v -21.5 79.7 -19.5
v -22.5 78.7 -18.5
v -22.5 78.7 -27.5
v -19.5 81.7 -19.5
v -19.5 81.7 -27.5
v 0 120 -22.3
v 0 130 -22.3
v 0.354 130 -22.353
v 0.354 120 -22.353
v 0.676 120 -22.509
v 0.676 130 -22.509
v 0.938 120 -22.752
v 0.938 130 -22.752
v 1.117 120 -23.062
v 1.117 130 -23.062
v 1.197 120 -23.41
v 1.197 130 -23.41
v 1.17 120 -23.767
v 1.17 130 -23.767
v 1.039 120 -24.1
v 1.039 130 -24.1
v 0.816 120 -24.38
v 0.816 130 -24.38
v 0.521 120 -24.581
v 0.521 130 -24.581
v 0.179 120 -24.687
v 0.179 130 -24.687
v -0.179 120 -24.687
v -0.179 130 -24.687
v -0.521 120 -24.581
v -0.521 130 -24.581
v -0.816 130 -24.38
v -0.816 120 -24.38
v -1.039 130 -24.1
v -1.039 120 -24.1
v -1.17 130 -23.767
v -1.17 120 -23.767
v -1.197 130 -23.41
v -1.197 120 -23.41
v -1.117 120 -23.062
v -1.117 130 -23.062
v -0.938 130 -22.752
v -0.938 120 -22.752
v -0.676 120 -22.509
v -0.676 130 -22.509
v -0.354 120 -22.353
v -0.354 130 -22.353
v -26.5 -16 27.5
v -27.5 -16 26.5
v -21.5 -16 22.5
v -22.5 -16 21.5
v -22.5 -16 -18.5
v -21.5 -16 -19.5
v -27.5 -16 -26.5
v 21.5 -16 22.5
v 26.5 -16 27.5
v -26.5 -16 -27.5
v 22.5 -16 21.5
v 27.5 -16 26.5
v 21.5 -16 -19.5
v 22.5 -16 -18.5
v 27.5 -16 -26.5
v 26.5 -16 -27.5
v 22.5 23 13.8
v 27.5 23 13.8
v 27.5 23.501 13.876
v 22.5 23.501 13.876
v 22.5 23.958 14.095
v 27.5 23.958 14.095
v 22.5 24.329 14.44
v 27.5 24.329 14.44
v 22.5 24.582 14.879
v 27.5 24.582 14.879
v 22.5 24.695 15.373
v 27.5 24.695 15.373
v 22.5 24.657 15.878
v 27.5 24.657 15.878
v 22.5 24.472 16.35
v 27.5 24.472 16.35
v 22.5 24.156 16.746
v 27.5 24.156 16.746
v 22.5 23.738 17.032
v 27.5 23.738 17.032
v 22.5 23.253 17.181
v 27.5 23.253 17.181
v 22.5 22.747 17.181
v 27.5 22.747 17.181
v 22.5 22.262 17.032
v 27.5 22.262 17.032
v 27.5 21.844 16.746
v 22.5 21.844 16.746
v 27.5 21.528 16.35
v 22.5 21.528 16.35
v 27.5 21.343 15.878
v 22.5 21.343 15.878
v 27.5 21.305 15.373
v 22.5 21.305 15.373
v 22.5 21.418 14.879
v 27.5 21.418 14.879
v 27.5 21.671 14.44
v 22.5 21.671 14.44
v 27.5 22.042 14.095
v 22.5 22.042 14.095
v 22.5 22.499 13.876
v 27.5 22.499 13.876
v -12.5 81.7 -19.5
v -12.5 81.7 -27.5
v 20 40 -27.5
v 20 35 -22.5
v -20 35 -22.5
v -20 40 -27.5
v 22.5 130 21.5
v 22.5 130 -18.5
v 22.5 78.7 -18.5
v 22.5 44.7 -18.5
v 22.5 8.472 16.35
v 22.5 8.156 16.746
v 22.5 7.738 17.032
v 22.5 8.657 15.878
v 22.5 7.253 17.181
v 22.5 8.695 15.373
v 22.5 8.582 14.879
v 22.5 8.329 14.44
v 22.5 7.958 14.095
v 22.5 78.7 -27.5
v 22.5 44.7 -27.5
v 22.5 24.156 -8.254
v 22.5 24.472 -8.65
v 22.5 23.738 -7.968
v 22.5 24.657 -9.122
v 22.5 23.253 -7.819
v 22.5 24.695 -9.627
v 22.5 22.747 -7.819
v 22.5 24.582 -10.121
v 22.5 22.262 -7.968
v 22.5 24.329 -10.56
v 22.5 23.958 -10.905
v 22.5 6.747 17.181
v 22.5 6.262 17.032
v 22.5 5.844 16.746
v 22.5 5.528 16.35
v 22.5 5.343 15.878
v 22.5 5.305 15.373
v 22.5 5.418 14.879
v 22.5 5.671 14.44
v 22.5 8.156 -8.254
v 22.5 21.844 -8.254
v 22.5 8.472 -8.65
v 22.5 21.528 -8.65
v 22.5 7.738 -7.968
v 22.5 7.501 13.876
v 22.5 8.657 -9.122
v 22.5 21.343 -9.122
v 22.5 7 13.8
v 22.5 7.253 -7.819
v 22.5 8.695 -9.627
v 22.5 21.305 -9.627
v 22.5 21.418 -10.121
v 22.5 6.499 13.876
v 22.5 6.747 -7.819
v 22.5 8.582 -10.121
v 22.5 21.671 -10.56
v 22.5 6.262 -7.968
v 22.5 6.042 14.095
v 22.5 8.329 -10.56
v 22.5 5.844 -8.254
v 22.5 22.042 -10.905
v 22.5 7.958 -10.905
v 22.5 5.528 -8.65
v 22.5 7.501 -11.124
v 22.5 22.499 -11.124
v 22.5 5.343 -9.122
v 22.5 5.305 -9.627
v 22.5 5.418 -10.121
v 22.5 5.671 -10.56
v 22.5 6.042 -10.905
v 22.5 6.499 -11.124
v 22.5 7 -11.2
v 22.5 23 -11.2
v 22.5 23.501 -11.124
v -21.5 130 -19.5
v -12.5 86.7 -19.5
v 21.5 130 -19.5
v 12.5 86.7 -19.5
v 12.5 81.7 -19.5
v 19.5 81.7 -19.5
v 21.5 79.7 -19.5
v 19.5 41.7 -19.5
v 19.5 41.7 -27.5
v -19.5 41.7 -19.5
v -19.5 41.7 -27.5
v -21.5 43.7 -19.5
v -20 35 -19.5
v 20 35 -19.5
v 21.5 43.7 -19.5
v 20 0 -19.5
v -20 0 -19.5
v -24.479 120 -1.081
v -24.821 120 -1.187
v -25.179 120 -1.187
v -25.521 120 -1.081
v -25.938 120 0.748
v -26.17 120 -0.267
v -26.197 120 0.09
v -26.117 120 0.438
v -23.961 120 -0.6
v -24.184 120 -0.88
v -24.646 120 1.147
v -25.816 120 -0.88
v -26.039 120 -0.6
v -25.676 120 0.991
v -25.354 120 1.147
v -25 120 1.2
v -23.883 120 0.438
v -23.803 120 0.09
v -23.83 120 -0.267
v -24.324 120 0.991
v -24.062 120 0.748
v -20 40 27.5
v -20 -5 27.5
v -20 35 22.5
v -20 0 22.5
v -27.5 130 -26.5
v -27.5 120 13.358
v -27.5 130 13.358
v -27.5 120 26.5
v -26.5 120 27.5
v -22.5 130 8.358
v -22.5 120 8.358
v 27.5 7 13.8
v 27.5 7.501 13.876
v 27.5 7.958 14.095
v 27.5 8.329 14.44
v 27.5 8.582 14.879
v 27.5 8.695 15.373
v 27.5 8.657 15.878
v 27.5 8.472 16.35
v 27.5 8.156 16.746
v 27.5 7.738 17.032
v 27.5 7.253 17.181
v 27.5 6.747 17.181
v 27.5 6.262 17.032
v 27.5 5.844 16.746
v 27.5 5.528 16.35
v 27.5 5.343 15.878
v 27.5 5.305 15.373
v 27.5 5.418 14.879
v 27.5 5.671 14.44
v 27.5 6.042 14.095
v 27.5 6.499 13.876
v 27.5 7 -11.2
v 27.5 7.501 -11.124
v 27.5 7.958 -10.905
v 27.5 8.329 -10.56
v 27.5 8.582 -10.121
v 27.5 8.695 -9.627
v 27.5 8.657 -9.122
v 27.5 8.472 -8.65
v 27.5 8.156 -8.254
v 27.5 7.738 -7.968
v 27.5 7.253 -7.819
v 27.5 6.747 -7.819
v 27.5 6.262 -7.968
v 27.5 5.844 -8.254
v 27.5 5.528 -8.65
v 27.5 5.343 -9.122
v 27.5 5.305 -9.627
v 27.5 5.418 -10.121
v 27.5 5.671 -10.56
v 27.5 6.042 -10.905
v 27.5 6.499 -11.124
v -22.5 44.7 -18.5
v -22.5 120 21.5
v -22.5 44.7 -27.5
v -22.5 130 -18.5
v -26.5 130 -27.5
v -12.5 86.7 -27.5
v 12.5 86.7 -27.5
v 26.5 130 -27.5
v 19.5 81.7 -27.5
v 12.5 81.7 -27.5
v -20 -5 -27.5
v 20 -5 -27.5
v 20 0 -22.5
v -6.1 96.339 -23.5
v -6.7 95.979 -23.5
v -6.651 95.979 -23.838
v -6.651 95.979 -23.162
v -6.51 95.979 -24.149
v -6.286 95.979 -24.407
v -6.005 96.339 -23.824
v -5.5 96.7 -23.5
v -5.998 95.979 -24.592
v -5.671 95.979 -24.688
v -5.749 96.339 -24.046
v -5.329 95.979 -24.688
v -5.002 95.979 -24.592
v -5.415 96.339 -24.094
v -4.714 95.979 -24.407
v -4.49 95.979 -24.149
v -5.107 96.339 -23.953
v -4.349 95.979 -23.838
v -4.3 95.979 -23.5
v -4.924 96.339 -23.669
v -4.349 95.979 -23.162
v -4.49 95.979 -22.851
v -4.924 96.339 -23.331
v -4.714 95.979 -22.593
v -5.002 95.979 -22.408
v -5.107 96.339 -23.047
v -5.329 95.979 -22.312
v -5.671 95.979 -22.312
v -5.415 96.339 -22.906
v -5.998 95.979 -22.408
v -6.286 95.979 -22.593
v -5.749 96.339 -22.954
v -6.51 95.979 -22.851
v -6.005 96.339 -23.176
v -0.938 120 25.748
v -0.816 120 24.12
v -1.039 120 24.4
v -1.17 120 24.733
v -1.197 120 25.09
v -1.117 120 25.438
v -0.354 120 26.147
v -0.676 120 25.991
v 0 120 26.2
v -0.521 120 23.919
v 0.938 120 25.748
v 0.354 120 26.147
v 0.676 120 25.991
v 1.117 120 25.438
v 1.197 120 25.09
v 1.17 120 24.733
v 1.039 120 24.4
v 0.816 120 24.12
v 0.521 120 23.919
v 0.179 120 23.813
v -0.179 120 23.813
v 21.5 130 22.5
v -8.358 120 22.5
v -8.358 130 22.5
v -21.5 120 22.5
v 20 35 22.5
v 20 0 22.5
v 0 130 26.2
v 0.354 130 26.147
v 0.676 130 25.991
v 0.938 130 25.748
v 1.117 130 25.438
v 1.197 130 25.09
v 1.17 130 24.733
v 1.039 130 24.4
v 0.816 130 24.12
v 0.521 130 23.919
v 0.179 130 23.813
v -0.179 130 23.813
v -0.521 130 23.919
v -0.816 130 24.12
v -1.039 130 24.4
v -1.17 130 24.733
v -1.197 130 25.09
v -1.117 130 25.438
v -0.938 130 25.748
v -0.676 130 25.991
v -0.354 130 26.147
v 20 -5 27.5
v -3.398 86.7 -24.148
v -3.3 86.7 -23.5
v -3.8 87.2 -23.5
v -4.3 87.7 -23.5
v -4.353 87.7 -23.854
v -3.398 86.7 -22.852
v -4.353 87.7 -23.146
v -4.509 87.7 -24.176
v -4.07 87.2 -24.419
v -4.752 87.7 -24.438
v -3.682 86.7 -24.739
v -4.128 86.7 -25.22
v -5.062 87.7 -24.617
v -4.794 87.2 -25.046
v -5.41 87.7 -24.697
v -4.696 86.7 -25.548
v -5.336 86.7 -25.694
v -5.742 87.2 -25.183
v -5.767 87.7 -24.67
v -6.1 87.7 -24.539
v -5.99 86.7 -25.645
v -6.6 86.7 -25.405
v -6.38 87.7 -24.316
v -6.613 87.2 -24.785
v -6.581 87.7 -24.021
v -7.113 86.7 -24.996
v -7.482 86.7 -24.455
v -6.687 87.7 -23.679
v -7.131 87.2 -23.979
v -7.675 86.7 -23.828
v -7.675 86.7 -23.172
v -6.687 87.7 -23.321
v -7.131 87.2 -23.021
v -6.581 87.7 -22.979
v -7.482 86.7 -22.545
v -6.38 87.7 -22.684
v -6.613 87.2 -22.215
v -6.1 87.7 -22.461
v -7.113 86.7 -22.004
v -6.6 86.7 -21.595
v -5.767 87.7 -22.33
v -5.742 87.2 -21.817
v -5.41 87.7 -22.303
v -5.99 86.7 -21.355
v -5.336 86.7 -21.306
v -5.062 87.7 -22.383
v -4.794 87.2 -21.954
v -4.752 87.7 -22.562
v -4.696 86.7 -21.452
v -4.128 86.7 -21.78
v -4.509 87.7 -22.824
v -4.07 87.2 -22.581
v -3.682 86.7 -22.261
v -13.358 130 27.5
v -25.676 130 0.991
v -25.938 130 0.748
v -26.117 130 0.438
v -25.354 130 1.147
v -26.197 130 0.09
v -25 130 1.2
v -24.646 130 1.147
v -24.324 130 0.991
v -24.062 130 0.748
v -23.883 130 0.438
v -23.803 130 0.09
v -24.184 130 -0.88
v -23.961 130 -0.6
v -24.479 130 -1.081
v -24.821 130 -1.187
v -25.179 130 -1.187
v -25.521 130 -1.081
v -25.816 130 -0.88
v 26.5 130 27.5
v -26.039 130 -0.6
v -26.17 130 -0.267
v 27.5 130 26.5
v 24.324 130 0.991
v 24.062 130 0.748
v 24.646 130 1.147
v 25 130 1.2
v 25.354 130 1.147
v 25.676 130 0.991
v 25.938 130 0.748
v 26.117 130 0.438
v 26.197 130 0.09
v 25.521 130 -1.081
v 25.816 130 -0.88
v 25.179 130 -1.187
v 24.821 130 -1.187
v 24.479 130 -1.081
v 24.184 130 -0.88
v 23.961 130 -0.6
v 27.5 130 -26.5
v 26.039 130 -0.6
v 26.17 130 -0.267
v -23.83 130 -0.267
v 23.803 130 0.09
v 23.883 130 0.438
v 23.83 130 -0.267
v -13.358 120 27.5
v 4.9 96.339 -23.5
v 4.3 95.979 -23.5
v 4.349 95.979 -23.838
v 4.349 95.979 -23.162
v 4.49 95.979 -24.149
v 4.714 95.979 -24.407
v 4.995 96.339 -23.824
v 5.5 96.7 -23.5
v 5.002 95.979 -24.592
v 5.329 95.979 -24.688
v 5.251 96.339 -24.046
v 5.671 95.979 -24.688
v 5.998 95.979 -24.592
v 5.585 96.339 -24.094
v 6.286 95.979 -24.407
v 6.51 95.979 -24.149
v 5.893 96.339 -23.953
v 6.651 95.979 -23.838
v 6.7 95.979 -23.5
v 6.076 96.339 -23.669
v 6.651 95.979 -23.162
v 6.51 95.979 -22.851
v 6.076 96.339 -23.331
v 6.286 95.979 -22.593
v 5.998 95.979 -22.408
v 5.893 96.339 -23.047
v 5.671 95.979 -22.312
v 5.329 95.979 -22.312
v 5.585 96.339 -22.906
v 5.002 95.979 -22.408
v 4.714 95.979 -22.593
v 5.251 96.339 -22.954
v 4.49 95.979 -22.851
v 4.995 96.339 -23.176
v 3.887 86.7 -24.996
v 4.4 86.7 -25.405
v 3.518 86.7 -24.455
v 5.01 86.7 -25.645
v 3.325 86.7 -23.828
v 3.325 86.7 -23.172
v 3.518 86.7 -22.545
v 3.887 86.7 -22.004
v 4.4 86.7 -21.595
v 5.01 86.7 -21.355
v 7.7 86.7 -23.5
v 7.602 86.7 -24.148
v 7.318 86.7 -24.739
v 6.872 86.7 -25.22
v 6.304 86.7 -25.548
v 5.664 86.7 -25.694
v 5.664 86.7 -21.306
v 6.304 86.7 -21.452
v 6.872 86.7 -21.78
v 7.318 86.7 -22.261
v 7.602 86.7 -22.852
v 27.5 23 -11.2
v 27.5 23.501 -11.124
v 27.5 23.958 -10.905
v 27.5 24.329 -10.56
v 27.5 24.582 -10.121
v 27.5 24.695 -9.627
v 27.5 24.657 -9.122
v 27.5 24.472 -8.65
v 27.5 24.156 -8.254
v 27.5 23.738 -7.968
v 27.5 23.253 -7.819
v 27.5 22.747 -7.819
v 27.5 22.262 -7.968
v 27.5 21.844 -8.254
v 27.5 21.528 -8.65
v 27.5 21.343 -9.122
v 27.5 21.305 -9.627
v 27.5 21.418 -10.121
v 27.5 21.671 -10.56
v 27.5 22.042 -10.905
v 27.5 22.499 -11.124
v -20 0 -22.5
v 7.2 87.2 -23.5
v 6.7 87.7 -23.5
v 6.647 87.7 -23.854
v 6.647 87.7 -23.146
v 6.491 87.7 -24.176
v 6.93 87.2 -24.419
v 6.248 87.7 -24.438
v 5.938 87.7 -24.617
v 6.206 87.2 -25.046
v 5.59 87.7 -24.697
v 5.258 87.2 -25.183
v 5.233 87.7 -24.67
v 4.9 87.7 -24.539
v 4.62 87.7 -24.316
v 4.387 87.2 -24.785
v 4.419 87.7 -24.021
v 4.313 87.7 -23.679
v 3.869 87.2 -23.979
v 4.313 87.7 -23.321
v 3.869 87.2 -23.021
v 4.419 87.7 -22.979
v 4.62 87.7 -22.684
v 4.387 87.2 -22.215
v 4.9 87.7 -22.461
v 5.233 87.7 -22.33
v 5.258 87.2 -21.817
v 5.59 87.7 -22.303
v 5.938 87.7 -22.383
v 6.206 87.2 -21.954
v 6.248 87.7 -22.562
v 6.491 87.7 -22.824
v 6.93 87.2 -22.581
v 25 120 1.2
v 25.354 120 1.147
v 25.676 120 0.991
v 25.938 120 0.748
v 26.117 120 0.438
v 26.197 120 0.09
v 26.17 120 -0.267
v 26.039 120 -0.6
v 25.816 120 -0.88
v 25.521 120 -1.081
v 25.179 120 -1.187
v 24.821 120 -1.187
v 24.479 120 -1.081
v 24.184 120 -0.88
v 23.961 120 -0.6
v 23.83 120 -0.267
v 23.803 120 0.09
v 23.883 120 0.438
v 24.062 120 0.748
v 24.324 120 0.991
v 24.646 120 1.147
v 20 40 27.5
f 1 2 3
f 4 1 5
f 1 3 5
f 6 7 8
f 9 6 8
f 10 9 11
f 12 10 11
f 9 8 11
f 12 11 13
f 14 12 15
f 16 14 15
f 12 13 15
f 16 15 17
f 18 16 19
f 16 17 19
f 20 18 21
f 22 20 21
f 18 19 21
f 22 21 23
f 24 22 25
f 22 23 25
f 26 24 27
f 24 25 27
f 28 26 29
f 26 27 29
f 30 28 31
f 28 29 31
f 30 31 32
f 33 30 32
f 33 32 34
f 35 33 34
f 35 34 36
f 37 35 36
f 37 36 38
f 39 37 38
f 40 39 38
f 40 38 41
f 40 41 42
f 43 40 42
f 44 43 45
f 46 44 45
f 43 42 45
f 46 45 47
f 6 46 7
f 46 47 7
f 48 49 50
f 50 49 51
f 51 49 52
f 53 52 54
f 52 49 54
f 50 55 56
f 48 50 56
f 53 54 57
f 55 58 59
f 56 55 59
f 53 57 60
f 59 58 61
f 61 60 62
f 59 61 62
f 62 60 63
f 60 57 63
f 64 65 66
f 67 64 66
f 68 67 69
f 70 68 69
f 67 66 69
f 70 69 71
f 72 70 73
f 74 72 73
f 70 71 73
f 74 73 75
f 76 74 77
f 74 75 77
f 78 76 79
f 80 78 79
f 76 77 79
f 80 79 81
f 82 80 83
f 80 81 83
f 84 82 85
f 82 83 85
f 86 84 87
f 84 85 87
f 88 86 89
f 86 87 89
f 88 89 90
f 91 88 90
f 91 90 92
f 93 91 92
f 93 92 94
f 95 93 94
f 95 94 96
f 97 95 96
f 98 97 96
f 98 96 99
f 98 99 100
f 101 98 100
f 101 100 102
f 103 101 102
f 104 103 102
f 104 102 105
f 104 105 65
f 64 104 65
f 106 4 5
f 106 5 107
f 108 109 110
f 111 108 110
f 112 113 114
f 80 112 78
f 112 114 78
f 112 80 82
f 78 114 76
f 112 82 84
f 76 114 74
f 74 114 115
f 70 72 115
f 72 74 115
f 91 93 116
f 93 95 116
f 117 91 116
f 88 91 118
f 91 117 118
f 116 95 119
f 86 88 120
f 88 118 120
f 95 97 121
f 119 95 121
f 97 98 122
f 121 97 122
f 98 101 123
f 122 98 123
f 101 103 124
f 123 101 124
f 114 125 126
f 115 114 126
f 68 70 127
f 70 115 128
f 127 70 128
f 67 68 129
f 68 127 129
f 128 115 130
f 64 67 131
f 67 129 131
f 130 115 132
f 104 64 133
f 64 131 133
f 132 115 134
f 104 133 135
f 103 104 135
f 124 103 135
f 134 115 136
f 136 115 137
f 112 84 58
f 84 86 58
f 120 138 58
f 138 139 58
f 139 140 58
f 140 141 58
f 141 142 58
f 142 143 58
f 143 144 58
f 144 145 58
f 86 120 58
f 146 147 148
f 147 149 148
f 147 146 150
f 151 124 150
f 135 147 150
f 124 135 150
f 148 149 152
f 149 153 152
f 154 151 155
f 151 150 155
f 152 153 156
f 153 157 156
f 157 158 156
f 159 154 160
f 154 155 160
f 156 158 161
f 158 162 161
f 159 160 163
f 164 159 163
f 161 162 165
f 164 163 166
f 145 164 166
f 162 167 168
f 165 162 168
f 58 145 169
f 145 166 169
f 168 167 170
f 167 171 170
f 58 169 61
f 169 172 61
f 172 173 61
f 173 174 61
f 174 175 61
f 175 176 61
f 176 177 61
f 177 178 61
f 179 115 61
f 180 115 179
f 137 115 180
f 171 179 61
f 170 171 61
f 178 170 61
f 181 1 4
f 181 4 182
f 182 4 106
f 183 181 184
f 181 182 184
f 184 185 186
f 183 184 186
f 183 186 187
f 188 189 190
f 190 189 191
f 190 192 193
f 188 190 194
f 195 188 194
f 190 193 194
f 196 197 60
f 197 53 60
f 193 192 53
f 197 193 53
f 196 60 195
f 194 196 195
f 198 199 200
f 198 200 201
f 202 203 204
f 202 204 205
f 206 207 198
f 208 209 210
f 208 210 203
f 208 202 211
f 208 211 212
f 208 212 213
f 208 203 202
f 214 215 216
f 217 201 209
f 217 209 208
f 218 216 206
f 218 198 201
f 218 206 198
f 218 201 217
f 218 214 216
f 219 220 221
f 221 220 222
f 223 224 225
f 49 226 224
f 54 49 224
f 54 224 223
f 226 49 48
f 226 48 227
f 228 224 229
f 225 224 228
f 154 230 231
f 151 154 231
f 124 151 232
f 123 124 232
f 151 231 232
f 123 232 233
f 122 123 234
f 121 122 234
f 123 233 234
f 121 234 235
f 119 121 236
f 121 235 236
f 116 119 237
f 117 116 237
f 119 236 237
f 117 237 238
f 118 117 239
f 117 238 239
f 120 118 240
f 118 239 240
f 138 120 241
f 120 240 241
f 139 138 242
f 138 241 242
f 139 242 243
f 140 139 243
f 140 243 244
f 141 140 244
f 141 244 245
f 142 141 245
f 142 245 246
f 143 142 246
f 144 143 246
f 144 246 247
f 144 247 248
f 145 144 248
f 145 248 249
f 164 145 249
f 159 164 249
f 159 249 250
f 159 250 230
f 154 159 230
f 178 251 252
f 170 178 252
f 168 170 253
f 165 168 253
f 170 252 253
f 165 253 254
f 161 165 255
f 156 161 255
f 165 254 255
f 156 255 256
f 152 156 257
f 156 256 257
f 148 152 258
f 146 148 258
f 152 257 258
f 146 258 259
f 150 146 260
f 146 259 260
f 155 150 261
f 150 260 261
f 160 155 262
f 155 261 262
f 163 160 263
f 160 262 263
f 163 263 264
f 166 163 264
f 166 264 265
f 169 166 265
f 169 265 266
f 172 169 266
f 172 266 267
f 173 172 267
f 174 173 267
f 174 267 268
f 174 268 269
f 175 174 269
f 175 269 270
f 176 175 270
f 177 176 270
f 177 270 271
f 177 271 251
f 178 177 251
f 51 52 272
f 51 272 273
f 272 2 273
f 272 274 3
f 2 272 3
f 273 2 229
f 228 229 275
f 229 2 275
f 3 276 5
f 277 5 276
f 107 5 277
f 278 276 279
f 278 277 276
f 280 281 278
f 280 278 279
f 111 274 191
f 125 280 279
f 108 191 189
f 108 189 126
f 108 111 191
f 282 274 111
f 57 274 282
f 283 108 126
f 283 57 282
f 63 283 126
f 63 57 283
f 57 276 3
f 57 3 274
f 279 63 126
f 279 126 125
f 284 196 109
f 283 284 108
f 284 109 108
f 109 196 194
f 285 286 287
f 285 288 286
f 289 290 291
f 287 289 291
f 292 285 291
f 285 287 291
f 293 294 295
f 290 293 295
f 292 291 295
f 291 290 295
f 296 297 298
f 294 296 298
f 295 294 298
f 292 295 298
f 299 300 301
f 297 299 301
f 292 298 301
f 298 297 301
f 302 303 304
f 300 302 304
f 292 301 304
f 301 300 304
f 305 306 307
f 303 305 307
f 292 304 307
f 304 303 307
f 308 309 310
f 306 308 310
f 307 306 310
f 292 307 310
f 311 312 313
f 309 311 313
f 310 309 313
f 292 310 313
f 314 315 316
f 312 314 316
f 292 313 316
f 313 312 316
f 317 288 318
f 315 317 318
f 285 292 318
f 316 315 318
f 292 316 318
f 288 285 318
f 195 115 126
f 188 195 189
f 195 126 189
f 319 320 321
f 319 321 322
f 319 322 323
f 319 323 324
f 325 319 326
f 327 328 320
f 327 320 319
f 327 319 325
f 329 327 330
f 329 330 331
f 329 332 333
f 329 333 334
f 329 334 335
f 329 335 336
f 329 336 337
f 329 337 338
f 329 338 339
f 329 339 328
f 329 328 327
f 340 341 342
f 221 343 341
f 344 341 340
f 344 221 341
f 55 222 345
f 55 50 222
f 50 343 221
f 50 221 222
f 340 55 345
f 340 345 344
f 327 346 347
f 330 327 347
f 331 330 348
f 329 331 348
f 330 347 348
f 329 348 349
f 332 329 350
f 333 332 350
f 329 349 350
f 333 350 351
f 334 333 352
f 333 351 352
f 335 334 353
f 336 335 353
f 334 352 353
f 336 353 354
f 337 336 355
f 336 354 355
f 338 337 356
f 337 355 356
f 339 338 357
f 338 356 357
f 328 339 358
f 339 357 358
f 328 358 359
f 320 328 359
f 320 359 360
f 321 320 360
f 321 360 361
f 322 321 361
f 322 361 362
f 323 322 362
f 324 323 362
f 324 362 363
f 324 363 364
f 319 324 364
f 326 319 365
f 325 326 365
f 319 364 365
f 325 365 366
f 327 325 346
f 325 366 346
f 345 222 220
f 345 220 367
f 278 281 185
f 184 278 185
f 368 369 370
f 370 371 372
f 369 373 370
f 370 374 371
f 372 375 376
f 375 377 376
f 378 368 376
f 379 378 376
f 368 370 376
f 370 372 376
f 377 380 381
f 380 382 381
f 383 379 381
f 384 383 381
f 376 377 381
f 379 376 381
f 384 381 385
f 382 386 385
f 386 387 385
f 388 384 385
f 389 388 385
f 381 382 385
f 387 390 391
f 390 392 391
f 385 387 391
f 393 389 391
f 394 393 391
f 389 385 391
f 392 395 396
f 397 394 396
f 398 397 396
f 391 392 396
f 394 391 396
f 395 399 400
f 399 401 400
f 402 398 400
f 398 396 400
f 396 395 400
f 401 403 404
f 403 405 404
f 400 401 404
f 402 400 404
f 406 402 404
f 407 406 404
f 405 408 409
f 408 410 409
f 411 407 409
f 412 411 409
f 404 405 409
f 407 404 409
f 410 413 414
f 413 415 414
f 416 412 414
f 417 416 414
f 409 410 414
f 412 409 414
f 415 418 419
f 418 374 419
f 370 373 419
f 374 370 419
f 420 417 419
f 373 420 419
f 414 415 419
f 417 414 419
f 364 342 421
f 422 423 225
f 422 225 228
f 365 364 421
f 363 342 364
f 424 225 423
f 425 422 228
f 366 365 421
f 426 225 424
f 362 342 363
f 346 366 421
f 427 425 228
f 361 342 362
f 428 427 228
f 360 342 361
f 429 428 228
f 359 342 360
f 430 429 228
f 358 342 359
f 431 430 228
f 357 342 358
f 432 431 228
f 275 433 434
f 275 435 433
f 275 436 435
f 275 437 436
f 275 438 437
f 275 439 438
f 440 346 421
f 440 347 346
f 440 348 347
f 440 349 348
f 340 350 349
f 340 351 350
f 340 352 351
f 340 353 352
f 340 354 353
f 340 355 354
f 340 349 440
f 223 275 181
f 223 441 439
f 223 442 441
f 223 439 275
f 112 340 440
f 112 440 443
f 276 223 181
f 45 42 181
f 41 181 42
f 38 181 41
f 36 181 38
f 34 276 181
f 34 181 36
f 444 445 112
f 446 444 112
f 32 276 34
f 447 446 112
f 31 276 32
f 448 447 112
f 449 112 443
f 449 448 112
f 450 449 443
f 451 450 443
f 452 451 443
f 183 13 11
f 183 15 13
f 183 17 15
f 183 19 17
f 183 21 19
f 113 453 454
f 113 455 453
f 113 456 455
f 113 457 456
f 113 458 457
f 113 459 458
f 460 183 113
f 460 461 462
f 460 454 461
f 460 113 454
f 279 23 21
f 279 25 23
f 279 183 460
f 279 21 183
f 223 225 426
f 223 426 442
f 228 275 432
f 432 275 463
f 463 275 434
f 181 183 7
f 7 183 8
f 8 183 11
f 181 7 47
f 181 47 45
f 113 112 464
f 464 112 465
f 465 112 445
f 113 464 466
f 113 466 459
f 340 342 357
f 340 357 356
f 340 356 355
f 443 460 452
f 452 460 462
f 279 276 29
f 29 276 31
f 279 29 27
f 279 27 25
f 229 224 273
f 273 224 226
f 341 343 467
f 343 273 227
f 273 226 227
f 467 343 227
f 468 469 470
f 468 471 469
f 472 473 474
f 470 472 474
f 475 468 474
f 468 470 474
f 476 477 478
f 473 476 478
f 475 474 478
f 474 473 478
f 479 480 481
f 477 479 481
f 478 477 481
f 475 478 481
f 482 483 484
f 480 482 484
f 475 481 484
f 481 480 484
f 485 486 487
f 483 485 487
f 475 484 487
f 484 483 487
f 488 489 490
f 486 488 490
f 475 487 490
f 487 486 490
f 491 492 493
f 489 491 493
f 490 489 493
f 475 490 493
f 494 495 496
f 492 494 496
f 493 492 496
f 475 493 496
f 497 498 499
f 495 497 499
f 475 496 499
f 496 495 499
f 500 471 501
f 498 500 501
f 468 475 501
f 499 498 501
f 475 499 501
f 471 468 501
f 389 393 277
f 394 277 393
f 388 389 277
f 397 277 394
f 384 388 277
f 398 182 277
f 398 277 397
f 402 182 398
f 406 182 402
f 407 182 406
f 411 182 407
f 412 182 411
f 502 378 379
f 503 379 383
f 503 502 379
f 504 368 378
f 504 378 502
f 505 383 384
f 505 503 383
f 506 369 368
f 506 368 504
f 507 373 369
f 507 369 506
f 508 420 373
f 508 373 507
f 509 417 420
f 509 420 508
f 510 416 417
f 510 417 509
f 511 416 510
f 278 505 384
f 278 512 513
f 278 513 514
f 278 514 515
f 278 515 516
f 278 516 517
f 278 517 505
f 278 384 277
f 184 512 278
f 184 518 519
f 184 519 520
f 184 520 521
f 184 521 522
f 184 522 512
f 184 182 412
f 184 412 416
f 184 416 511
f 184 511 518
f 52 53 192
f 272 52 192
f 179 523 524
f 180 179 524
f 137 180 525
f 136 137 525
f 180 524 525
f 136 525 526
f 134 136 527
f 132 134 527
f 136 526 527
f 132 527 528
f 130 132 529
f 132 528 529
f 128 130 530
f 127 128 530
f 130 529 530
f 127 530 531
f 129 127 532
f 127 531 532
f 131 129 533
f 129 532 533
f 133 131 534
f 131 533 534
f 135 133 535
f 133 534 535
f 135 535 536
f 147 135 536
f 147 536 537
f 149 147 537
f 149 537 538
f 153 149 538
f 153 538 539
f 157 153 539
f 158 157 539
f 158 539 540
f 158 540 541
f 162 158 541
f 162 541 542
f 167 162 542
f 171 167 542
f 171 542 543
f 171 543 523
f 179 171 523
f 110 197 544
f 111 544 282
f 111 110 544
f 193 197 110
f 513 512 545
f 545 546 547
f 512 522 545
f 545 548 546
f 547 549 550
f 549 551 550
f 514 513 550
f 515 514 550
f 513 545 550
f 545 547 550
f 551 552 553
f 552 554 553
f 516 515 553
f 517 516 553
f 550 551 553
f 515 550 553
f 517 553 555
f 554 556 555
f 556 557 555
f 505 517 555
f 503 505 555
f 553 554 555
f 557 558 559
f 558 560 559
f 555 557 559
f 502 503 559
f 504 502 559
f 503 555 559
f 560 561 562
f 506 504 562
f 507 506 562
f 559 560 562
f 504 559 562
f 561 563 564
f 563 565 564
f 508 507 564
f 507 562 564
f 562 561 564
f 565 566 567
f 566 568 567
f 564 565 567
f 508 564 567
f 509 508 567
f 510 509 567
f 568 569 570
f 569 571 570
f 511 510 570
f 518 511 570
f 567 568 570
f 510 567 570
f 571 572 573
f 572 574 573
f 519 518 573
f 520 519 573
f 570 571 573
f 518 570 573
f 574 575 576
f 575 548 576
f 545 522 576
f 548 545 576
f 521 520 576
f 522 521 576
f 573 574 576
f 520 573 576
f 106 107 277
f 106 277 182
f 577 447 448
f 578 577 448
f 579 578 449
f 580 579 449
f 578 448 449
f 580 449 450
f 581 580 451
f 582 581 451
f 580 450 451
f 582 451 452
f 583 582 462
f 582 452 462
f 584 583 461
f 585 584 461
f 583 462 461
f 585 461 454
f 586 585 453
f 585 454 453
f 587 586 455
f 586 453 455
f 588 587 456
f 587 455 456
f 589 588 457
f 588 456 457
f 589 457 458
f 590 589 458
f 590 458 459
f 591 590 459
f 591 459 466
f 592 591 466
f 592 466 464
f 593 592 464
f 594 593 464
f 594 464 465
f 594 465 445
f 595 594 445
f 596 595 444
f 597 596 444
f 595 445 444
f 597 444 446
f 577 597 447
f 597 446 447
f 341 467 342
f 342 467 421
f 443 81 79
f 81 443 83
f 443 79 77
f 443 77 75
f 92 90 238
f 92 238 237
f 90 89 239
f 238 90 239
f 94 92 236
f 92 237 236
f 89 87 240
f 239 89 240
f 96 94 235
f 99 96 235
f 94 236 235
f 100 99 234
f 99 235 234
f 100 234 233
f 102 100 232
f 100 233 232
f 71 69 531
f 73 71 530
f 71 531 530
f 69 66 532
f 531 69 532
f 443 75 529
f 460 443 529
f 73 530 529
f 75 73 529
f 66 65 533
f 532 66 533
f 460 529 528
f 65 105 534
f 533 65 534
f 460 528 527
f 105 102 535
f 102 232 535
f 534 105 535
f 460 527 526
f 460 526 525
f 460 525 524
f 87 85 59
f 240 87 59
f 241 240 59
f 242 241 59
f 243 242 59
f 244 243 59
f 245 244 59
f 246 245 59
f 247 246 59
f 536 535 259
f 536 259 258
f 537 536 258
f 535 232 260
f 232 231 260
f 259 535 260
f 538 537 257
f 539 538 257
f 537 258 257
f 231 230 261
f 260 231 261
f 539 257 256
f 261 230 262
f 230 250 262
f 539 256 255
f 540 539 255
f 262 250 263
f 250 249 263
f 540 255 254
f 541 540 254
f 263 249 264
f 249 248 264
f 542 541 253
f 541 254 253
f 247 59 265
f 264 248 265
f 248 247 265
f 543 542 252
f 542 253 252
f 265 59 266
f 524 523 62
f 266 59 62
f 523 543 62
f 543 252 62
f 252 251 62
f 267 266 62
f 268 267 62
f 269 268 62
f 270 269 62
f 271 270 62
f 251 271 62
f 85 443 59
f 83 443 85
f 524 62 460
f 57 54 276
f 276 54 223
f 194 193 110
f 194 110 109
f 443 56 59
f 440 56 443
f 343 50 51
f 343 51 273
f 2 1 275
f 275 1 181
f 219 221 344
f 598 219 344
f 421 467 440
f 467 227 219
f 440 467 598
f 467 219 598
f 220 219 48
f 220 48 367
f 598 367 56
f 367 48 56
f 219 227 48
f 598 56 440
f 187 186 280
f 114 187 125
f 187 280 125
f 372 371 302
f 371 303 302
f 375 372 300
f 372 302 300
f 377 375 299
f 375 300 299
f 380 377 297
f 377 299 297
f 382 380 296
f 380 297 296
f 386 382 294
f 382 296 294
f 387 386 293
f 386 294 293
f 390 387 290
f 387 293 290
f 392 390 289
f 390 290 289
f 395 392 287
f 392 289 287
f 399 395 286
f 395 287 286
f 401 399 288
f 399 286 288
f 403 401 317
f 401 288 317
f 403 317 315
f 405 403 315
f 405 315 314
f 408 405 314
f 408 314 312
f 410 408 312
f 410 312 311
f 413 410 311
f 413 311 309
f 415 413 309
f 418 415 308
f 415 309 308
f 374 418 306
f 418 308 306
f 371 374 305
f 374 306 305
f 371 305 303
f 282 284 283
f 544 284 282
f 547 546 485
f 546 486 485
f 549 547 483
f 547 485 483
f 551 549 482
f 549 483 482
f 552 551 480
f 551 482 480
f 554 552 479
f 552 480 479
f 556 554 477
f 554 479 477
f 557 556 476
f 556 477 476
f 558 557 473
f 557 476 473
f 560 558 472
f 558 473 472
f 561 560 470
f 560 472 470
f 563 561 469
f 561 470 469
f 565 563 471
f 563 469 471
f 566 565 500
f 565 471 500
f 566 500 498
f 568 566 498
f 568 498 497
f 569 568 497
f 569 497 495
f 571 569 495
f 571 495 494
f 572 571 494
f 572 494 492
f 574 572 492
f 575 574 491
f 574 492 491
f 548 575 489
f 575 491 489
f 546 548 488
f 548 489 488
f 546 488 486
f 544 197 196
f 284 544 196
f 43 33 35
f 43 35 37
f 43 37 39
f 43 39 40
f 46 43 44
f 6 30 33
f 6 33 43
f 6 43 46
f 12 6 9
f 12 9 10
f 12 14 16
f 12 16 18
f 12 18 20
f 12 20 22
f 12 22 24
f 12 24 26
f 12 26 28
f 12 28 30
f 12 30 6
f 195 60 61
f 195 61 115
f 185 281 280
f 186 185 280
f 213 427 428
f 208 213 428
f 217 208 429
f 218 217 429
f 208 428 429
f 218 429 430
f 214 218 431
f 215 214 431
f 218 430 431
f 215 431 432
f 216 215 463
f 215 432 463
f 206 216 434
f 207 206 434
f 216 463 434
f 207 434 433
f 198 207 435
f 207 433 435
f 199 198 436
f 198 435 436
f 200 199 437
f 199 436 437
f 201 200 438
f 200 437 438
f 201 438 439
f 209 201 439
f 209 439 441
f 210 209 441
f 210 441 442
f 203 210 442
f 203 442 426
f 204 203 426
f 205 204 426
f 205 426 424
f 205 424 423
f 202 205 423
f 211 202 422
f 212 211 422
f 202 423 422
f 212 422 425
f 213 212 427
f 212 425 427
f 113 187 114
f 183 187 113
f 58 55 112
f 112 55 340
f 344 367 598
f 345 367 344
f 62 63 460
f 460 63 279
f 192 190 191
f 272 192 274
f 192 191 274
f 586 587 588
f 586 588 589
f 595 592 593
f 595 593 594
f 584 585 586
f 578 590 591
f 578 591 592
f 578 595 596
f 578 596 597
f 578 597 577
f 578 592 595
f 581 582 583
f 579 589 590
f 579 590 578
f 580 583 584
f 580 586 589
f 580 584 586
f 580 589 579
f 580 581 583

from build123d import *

# Parameters (mm, degrees)
BOSS_EXTRUDE1_DEPTH                             = 130
BOSS_EXTRUDE1_DEPTH_BACK                        = 16
SKETCH1_W                                       = 55
SKETCH1_H                                       = 55
SKETCH1_W_2                                     = 45
SKETCH1_H_2                                     = 42
SKETCH2_W                                       = 40
SKETCH2_H                                       = 35
CUT_EXTRUDE1_DEPTH                              = 168
CUT_EXTRUDE2_DEPTH                              = 10
SKETCH8_W                                       = 25
SKETCH8_H                                       = 8
CUT_EXTRUDE5_DEPTH                              = 5
CSK_FOR_M2_FLAT_HEAD_MACHINE_SCREW2_D           = 2.4
CSK_FOR_M2_FLAT_HEAD_MACHINE_SCREW2_DEPTH       = 9.278967257
CSK_FOR_M2_FLAT_HEAD_MACHINE_SCREW2_CSINK_D     = 4.4
CSK_FOR_M2_FLAT_HEAD_MACHINE_SCREW2_CSINK_ANGLE = 90
CSK_FOR_M2_FLAT_HEAD_MACHINE_SCREW2_TIP         = 0.721032743
CHAMFER1_SIZE                                   = 1
CHAMFER3_SIZE                                   = 1
CUT_EXTRUDE6_REACH                              = 153.131
SKETCH11_W                                      = 20
SKETCH11_H                                      = 10
CUT_EXTRUDE7_REACH                              = 145.81
SKETCH12_R                                      = 1.7
CHAMFER2_SIZE                                   = 5
SKETCH13_R                                      = 1.2
CUT_EXTRUDE8_DEPTH                              = 10


with BuildPart() as part:
    # Sketch1 → Boss-Extrude1 (new, two sides: drawn at the far end of the back side and taken through both)
    with BuildSketch(Plane(origin=(0, 0, 0), x_dir=(1, 0, 0), z_dir=(0, 1, 0)).offset(-BOSS_EXTRUDE1_DEPTH_BACK)):
        Rectangle(SKETCH1_W, SKETCH1_H)
        with Locations((0, -1.5)):
            Rectangle(SKETCH1_W_2, SKETCH1_H_2, mode=Mode.SUBTRACT)
    extrude(amount=BOSS_EXTRUDE1_DEPTH + BOSS_EXTRUDE1_DEPTH_BACK)

    # Sketch2 → Cut-Extrude1 (cut)
    with BuildSketch(Plane.XY.offset(27.5)):
        with Locations((0, 17.5)):
            Rectangle(SKETCH2_W, SKETCH2_H)
    extrude(amount=-CUT_EXTRUDE1_DEPTH, mode=Mode.SUBTRACT)

    # Sketch7 → Cut-Extrude2 (cut)
    with BuildSketch(Plane(origin=(0, 0, -27.5), x_dir=(-1, 0, 0), z_dir=(0, 0, -1))):
        Polygon((19.5, 41.7), (22.5, 44.7), (22.5, 78.7), (19.5, 81.7), (-19.5, 81.7), (-22.5, 78.7), (-22.5, 44.7), (-19.5, 41.7), align=None)
    extrude(amount=-CUT_EXTRUDE2_DEPTH, mode=Mode.SUBTRACT)

    # Sketch8 → Cut-Extrude5 (cut)
    with BuildSketch(Plane.XZ.offset(-81.7)):
        with Locations((0, -23.5)):
            Rectangle(SKETCH8_W, SKETCH8_H)
    extrude(amount=-CUT_EXTRUDE5_DEPTH, mode=Mode.SUBTRACT)

    # CSK for M2 Flat Head Machine Screw2
    with Locations(Plane(origin=(0, 86.7, 0), x_dir=(-1, 0, 0), z_dir=(0, -1, 0))):
        with Locations((-5.5, 23.5), (5.5, 23.5)):
            CounterSinkHole(CSK_FOR_M2_FLAT_HEAD_MACHINE_SCREW2_D / 2, CSK_FOR_M2_FLAT_HEAD_MACHINE_SCREW2_CSINK_D / 2, depth=CSK_FOR_M2_FLAT_HEAD_MACHINE_SCREW2_DEPTH, counter_sink_angle=CSK_FOR_M2_FLAT_HEAD_MACHINE_SCREW2_CSINK_ANGLE)
            with Locations((0, 0, -(CSK_FOR_M2_FLAT_HEAD_MACHINE_SCREW2_DEPTH + CSK_FOR_M2_FLAT_HEAD_MACHINE_SCREW2_TIP / 2))):  # 118° drill point
                Cone(0, CSK_FOR_M2_FLAT_HEAD_MACHINE_SCREW2_D / 2, CSK_FOR_M2_FLAT_HEAD_MACHINE_SCREW2_TIP, mode=Mode.SUBTRACT)

    # Chamfer1
    chamfer1_edges = [part.edges().sort_by_distance(p)[0] for p in [
        (-22.5, 57, 22.5),
        (22.5, 57, 22.5),
        (22.5, 14.35, -19.5),
        (-22.5, 14.35, -19.5),
        (22.5, 104.35, -19.5),
        (-22.5, 104.35, -19.5),
    ]]
    chamfer(chamfer1_edges, length=CHAMFER1_SIZE)

    # Chamfer3
    chamfer3_edges = [part.edges().sort_by_distance(p)[0] for p in [
        (27.5, 57, 27.5),
        (-27.5, 57, 27.5),
        (-27.5, 57, -27.5),
        (27.5, 57, -27.5),
    ]]
    chamfer(chamfer3_edges, length=CHAMFER3_SIZE)

    # Sketch11 → Cut-Extrude6 (cut, up to next)
    with BuildSketch(Plane(origin=(-27, 0, 27), x_dir=(0.7071067811865475, 0, 0.7071067811865477), z_dir=(-0.7071067811865477, 0, 0.7071067811865475)), mode=Mode.PRIVATE) as cut_extrude6_sk1:
        with Locations((0, 125)):
            Rectangle(SKETCH11_W, SKETCH11_H)
    cut_extrude6_tool1 = extrude(cut_extrude6_sk1.sketch, amount=-CUT_EXTRUDE6_REACH, mode=Mode.PRIVATE) & part.part
    add(cut_extrude6_tool1.solids().sort_by_distance((-27, 125, 27))[0], mode=Mode.SUBTRACT)

    # Sketch12 → Cut-Extrude7 (cut, up to next)
    with BuildSketch(Plane(origin=(27.5, 0, 0), x_dir=(0, 0, -1), z_dir=(1, 0, 0)), mode=Mode.PRIVATE) as cut_extrude7_sk1:
        with Locations((9.5, 7)):
            Circle(SKETCH12_R)
    cut_extrude7_tool1 = extrude(cut_extrude7_sk1.sketch, amount=-CUT_EXTRUDE7_REACH, mode=Mode.PRIVATE) & part.part
    # Sketch12 → Cut-Extrude7 (cut, up to next)
    with BuildSketch(Plane(origin=(27.5, 0, 0), x_dir=(0, 0, -1), z_dir=(1, 0, 0)), mode=Mode.PRIVATE) as cut_extrude7_sk2:
        with Locations((-15.5, 7)):
            Circle(SKETCH12_R)
    cut_extrude7_tool2 = extrude(cut_extrude7_sk2.sketch, amount=-CUT_EXTRUDE7_REACH, mode=Mode.PRIVATE) & part.part
    # Sketch12 → Cut-Extrude7 (cut, up to next)
    with BuildSketch(Plane(origin=(27.5, 0, 0), x_dir=(0, 0, -1), z_dir=(1, 0, 0)), mode=Mode.PRIVATE) as cut_extrude7_sk3:
        with Locations((-15.5, 23)):
            Circle(SKETCH12_R)
    cut_extrude7_tool3 = extrude(cut_extrude7_sk3.sketch, amount=-CUT_EXTRUDE7_REACH, mode=Mode.PRIVATE) & part.part
    # Sketch12 → Cut-Extrude7 (cut, up to next)
    with BuildSketch(Plane(origin=(27.5, 0, 0), x_dir=(0, 0, -1), z_dir=(1, 0, 0)), mode=Mode.PRIVATE) as cut_extrude7_sk4:
        with Locations((9.5, 23)):
            Circle(SKETCH12_R)
    cut_extrude7_tool4 = extrude(cut_extrude7_sk4.sketch, amount=-CUT_EXTRUDE7_REACH, mode=Mode.PRIVATE) & part.part
    add(cut_extrude7_tool1.solids().sort_by_distance((27.5, 7, -9.5))[0], mode=Mode.SUBTRACT)
    add(cut_extrude7_tool2.solids().sort_by_distance((27.5, 7, 15.5))[0], mode=Mode.SUBTRACT)
    add(cut_extrude7_tool3.solids().sort_by_distance((27.5, 23, 15.5))[0], mode=Mode.SUBTRACT)
    add(cut_extrude7_tool4.solids().sort_by_distance((27.5, 23, -9.5))[0], mode=Mode.SUBTRACT)

    # Chamfer2
    chamfer2_edges = [part.edges().sort_by_distance(p)[0] for p in [
        (0, 35, -27.5),
        (0, 0, -27.5),
        (0, 35, 27.5),
        (0, 0, 27.5),
    ]]
    chamfer(chamfer2_edges, length=CHAMFER2_SIZE - 0.0001)  # a hair under: the kernel refuses the full size

    # Sketch13 → Cut-Extrude8 (cut)
    with BuildSketch(Plane(origin=(0, 130, 0), x_dir=(1, 0, 0), z_dir=(0, 1, 0))):
        with Locations(Location((0, 23.5, 0), (0, 0, 270))):
            Circle(SKETCH13_R)
        with Locations(Location((0, -25, 0), (0, 0, 270))):
            Circle(SKETCH13_R)
        with Locations(Location((25, 0, 0), (0, 0, 270))):
            Circle(SKETCH13_R)
        with Locations(Location((-25, 0, 0), (0, 0, 270))):
            Circle(SKETCH13_R)
    extrude(amount=-CUT_EXTRUDE8_DEPTH, mode=Mode.SUBTRACT)


solid = part.part
